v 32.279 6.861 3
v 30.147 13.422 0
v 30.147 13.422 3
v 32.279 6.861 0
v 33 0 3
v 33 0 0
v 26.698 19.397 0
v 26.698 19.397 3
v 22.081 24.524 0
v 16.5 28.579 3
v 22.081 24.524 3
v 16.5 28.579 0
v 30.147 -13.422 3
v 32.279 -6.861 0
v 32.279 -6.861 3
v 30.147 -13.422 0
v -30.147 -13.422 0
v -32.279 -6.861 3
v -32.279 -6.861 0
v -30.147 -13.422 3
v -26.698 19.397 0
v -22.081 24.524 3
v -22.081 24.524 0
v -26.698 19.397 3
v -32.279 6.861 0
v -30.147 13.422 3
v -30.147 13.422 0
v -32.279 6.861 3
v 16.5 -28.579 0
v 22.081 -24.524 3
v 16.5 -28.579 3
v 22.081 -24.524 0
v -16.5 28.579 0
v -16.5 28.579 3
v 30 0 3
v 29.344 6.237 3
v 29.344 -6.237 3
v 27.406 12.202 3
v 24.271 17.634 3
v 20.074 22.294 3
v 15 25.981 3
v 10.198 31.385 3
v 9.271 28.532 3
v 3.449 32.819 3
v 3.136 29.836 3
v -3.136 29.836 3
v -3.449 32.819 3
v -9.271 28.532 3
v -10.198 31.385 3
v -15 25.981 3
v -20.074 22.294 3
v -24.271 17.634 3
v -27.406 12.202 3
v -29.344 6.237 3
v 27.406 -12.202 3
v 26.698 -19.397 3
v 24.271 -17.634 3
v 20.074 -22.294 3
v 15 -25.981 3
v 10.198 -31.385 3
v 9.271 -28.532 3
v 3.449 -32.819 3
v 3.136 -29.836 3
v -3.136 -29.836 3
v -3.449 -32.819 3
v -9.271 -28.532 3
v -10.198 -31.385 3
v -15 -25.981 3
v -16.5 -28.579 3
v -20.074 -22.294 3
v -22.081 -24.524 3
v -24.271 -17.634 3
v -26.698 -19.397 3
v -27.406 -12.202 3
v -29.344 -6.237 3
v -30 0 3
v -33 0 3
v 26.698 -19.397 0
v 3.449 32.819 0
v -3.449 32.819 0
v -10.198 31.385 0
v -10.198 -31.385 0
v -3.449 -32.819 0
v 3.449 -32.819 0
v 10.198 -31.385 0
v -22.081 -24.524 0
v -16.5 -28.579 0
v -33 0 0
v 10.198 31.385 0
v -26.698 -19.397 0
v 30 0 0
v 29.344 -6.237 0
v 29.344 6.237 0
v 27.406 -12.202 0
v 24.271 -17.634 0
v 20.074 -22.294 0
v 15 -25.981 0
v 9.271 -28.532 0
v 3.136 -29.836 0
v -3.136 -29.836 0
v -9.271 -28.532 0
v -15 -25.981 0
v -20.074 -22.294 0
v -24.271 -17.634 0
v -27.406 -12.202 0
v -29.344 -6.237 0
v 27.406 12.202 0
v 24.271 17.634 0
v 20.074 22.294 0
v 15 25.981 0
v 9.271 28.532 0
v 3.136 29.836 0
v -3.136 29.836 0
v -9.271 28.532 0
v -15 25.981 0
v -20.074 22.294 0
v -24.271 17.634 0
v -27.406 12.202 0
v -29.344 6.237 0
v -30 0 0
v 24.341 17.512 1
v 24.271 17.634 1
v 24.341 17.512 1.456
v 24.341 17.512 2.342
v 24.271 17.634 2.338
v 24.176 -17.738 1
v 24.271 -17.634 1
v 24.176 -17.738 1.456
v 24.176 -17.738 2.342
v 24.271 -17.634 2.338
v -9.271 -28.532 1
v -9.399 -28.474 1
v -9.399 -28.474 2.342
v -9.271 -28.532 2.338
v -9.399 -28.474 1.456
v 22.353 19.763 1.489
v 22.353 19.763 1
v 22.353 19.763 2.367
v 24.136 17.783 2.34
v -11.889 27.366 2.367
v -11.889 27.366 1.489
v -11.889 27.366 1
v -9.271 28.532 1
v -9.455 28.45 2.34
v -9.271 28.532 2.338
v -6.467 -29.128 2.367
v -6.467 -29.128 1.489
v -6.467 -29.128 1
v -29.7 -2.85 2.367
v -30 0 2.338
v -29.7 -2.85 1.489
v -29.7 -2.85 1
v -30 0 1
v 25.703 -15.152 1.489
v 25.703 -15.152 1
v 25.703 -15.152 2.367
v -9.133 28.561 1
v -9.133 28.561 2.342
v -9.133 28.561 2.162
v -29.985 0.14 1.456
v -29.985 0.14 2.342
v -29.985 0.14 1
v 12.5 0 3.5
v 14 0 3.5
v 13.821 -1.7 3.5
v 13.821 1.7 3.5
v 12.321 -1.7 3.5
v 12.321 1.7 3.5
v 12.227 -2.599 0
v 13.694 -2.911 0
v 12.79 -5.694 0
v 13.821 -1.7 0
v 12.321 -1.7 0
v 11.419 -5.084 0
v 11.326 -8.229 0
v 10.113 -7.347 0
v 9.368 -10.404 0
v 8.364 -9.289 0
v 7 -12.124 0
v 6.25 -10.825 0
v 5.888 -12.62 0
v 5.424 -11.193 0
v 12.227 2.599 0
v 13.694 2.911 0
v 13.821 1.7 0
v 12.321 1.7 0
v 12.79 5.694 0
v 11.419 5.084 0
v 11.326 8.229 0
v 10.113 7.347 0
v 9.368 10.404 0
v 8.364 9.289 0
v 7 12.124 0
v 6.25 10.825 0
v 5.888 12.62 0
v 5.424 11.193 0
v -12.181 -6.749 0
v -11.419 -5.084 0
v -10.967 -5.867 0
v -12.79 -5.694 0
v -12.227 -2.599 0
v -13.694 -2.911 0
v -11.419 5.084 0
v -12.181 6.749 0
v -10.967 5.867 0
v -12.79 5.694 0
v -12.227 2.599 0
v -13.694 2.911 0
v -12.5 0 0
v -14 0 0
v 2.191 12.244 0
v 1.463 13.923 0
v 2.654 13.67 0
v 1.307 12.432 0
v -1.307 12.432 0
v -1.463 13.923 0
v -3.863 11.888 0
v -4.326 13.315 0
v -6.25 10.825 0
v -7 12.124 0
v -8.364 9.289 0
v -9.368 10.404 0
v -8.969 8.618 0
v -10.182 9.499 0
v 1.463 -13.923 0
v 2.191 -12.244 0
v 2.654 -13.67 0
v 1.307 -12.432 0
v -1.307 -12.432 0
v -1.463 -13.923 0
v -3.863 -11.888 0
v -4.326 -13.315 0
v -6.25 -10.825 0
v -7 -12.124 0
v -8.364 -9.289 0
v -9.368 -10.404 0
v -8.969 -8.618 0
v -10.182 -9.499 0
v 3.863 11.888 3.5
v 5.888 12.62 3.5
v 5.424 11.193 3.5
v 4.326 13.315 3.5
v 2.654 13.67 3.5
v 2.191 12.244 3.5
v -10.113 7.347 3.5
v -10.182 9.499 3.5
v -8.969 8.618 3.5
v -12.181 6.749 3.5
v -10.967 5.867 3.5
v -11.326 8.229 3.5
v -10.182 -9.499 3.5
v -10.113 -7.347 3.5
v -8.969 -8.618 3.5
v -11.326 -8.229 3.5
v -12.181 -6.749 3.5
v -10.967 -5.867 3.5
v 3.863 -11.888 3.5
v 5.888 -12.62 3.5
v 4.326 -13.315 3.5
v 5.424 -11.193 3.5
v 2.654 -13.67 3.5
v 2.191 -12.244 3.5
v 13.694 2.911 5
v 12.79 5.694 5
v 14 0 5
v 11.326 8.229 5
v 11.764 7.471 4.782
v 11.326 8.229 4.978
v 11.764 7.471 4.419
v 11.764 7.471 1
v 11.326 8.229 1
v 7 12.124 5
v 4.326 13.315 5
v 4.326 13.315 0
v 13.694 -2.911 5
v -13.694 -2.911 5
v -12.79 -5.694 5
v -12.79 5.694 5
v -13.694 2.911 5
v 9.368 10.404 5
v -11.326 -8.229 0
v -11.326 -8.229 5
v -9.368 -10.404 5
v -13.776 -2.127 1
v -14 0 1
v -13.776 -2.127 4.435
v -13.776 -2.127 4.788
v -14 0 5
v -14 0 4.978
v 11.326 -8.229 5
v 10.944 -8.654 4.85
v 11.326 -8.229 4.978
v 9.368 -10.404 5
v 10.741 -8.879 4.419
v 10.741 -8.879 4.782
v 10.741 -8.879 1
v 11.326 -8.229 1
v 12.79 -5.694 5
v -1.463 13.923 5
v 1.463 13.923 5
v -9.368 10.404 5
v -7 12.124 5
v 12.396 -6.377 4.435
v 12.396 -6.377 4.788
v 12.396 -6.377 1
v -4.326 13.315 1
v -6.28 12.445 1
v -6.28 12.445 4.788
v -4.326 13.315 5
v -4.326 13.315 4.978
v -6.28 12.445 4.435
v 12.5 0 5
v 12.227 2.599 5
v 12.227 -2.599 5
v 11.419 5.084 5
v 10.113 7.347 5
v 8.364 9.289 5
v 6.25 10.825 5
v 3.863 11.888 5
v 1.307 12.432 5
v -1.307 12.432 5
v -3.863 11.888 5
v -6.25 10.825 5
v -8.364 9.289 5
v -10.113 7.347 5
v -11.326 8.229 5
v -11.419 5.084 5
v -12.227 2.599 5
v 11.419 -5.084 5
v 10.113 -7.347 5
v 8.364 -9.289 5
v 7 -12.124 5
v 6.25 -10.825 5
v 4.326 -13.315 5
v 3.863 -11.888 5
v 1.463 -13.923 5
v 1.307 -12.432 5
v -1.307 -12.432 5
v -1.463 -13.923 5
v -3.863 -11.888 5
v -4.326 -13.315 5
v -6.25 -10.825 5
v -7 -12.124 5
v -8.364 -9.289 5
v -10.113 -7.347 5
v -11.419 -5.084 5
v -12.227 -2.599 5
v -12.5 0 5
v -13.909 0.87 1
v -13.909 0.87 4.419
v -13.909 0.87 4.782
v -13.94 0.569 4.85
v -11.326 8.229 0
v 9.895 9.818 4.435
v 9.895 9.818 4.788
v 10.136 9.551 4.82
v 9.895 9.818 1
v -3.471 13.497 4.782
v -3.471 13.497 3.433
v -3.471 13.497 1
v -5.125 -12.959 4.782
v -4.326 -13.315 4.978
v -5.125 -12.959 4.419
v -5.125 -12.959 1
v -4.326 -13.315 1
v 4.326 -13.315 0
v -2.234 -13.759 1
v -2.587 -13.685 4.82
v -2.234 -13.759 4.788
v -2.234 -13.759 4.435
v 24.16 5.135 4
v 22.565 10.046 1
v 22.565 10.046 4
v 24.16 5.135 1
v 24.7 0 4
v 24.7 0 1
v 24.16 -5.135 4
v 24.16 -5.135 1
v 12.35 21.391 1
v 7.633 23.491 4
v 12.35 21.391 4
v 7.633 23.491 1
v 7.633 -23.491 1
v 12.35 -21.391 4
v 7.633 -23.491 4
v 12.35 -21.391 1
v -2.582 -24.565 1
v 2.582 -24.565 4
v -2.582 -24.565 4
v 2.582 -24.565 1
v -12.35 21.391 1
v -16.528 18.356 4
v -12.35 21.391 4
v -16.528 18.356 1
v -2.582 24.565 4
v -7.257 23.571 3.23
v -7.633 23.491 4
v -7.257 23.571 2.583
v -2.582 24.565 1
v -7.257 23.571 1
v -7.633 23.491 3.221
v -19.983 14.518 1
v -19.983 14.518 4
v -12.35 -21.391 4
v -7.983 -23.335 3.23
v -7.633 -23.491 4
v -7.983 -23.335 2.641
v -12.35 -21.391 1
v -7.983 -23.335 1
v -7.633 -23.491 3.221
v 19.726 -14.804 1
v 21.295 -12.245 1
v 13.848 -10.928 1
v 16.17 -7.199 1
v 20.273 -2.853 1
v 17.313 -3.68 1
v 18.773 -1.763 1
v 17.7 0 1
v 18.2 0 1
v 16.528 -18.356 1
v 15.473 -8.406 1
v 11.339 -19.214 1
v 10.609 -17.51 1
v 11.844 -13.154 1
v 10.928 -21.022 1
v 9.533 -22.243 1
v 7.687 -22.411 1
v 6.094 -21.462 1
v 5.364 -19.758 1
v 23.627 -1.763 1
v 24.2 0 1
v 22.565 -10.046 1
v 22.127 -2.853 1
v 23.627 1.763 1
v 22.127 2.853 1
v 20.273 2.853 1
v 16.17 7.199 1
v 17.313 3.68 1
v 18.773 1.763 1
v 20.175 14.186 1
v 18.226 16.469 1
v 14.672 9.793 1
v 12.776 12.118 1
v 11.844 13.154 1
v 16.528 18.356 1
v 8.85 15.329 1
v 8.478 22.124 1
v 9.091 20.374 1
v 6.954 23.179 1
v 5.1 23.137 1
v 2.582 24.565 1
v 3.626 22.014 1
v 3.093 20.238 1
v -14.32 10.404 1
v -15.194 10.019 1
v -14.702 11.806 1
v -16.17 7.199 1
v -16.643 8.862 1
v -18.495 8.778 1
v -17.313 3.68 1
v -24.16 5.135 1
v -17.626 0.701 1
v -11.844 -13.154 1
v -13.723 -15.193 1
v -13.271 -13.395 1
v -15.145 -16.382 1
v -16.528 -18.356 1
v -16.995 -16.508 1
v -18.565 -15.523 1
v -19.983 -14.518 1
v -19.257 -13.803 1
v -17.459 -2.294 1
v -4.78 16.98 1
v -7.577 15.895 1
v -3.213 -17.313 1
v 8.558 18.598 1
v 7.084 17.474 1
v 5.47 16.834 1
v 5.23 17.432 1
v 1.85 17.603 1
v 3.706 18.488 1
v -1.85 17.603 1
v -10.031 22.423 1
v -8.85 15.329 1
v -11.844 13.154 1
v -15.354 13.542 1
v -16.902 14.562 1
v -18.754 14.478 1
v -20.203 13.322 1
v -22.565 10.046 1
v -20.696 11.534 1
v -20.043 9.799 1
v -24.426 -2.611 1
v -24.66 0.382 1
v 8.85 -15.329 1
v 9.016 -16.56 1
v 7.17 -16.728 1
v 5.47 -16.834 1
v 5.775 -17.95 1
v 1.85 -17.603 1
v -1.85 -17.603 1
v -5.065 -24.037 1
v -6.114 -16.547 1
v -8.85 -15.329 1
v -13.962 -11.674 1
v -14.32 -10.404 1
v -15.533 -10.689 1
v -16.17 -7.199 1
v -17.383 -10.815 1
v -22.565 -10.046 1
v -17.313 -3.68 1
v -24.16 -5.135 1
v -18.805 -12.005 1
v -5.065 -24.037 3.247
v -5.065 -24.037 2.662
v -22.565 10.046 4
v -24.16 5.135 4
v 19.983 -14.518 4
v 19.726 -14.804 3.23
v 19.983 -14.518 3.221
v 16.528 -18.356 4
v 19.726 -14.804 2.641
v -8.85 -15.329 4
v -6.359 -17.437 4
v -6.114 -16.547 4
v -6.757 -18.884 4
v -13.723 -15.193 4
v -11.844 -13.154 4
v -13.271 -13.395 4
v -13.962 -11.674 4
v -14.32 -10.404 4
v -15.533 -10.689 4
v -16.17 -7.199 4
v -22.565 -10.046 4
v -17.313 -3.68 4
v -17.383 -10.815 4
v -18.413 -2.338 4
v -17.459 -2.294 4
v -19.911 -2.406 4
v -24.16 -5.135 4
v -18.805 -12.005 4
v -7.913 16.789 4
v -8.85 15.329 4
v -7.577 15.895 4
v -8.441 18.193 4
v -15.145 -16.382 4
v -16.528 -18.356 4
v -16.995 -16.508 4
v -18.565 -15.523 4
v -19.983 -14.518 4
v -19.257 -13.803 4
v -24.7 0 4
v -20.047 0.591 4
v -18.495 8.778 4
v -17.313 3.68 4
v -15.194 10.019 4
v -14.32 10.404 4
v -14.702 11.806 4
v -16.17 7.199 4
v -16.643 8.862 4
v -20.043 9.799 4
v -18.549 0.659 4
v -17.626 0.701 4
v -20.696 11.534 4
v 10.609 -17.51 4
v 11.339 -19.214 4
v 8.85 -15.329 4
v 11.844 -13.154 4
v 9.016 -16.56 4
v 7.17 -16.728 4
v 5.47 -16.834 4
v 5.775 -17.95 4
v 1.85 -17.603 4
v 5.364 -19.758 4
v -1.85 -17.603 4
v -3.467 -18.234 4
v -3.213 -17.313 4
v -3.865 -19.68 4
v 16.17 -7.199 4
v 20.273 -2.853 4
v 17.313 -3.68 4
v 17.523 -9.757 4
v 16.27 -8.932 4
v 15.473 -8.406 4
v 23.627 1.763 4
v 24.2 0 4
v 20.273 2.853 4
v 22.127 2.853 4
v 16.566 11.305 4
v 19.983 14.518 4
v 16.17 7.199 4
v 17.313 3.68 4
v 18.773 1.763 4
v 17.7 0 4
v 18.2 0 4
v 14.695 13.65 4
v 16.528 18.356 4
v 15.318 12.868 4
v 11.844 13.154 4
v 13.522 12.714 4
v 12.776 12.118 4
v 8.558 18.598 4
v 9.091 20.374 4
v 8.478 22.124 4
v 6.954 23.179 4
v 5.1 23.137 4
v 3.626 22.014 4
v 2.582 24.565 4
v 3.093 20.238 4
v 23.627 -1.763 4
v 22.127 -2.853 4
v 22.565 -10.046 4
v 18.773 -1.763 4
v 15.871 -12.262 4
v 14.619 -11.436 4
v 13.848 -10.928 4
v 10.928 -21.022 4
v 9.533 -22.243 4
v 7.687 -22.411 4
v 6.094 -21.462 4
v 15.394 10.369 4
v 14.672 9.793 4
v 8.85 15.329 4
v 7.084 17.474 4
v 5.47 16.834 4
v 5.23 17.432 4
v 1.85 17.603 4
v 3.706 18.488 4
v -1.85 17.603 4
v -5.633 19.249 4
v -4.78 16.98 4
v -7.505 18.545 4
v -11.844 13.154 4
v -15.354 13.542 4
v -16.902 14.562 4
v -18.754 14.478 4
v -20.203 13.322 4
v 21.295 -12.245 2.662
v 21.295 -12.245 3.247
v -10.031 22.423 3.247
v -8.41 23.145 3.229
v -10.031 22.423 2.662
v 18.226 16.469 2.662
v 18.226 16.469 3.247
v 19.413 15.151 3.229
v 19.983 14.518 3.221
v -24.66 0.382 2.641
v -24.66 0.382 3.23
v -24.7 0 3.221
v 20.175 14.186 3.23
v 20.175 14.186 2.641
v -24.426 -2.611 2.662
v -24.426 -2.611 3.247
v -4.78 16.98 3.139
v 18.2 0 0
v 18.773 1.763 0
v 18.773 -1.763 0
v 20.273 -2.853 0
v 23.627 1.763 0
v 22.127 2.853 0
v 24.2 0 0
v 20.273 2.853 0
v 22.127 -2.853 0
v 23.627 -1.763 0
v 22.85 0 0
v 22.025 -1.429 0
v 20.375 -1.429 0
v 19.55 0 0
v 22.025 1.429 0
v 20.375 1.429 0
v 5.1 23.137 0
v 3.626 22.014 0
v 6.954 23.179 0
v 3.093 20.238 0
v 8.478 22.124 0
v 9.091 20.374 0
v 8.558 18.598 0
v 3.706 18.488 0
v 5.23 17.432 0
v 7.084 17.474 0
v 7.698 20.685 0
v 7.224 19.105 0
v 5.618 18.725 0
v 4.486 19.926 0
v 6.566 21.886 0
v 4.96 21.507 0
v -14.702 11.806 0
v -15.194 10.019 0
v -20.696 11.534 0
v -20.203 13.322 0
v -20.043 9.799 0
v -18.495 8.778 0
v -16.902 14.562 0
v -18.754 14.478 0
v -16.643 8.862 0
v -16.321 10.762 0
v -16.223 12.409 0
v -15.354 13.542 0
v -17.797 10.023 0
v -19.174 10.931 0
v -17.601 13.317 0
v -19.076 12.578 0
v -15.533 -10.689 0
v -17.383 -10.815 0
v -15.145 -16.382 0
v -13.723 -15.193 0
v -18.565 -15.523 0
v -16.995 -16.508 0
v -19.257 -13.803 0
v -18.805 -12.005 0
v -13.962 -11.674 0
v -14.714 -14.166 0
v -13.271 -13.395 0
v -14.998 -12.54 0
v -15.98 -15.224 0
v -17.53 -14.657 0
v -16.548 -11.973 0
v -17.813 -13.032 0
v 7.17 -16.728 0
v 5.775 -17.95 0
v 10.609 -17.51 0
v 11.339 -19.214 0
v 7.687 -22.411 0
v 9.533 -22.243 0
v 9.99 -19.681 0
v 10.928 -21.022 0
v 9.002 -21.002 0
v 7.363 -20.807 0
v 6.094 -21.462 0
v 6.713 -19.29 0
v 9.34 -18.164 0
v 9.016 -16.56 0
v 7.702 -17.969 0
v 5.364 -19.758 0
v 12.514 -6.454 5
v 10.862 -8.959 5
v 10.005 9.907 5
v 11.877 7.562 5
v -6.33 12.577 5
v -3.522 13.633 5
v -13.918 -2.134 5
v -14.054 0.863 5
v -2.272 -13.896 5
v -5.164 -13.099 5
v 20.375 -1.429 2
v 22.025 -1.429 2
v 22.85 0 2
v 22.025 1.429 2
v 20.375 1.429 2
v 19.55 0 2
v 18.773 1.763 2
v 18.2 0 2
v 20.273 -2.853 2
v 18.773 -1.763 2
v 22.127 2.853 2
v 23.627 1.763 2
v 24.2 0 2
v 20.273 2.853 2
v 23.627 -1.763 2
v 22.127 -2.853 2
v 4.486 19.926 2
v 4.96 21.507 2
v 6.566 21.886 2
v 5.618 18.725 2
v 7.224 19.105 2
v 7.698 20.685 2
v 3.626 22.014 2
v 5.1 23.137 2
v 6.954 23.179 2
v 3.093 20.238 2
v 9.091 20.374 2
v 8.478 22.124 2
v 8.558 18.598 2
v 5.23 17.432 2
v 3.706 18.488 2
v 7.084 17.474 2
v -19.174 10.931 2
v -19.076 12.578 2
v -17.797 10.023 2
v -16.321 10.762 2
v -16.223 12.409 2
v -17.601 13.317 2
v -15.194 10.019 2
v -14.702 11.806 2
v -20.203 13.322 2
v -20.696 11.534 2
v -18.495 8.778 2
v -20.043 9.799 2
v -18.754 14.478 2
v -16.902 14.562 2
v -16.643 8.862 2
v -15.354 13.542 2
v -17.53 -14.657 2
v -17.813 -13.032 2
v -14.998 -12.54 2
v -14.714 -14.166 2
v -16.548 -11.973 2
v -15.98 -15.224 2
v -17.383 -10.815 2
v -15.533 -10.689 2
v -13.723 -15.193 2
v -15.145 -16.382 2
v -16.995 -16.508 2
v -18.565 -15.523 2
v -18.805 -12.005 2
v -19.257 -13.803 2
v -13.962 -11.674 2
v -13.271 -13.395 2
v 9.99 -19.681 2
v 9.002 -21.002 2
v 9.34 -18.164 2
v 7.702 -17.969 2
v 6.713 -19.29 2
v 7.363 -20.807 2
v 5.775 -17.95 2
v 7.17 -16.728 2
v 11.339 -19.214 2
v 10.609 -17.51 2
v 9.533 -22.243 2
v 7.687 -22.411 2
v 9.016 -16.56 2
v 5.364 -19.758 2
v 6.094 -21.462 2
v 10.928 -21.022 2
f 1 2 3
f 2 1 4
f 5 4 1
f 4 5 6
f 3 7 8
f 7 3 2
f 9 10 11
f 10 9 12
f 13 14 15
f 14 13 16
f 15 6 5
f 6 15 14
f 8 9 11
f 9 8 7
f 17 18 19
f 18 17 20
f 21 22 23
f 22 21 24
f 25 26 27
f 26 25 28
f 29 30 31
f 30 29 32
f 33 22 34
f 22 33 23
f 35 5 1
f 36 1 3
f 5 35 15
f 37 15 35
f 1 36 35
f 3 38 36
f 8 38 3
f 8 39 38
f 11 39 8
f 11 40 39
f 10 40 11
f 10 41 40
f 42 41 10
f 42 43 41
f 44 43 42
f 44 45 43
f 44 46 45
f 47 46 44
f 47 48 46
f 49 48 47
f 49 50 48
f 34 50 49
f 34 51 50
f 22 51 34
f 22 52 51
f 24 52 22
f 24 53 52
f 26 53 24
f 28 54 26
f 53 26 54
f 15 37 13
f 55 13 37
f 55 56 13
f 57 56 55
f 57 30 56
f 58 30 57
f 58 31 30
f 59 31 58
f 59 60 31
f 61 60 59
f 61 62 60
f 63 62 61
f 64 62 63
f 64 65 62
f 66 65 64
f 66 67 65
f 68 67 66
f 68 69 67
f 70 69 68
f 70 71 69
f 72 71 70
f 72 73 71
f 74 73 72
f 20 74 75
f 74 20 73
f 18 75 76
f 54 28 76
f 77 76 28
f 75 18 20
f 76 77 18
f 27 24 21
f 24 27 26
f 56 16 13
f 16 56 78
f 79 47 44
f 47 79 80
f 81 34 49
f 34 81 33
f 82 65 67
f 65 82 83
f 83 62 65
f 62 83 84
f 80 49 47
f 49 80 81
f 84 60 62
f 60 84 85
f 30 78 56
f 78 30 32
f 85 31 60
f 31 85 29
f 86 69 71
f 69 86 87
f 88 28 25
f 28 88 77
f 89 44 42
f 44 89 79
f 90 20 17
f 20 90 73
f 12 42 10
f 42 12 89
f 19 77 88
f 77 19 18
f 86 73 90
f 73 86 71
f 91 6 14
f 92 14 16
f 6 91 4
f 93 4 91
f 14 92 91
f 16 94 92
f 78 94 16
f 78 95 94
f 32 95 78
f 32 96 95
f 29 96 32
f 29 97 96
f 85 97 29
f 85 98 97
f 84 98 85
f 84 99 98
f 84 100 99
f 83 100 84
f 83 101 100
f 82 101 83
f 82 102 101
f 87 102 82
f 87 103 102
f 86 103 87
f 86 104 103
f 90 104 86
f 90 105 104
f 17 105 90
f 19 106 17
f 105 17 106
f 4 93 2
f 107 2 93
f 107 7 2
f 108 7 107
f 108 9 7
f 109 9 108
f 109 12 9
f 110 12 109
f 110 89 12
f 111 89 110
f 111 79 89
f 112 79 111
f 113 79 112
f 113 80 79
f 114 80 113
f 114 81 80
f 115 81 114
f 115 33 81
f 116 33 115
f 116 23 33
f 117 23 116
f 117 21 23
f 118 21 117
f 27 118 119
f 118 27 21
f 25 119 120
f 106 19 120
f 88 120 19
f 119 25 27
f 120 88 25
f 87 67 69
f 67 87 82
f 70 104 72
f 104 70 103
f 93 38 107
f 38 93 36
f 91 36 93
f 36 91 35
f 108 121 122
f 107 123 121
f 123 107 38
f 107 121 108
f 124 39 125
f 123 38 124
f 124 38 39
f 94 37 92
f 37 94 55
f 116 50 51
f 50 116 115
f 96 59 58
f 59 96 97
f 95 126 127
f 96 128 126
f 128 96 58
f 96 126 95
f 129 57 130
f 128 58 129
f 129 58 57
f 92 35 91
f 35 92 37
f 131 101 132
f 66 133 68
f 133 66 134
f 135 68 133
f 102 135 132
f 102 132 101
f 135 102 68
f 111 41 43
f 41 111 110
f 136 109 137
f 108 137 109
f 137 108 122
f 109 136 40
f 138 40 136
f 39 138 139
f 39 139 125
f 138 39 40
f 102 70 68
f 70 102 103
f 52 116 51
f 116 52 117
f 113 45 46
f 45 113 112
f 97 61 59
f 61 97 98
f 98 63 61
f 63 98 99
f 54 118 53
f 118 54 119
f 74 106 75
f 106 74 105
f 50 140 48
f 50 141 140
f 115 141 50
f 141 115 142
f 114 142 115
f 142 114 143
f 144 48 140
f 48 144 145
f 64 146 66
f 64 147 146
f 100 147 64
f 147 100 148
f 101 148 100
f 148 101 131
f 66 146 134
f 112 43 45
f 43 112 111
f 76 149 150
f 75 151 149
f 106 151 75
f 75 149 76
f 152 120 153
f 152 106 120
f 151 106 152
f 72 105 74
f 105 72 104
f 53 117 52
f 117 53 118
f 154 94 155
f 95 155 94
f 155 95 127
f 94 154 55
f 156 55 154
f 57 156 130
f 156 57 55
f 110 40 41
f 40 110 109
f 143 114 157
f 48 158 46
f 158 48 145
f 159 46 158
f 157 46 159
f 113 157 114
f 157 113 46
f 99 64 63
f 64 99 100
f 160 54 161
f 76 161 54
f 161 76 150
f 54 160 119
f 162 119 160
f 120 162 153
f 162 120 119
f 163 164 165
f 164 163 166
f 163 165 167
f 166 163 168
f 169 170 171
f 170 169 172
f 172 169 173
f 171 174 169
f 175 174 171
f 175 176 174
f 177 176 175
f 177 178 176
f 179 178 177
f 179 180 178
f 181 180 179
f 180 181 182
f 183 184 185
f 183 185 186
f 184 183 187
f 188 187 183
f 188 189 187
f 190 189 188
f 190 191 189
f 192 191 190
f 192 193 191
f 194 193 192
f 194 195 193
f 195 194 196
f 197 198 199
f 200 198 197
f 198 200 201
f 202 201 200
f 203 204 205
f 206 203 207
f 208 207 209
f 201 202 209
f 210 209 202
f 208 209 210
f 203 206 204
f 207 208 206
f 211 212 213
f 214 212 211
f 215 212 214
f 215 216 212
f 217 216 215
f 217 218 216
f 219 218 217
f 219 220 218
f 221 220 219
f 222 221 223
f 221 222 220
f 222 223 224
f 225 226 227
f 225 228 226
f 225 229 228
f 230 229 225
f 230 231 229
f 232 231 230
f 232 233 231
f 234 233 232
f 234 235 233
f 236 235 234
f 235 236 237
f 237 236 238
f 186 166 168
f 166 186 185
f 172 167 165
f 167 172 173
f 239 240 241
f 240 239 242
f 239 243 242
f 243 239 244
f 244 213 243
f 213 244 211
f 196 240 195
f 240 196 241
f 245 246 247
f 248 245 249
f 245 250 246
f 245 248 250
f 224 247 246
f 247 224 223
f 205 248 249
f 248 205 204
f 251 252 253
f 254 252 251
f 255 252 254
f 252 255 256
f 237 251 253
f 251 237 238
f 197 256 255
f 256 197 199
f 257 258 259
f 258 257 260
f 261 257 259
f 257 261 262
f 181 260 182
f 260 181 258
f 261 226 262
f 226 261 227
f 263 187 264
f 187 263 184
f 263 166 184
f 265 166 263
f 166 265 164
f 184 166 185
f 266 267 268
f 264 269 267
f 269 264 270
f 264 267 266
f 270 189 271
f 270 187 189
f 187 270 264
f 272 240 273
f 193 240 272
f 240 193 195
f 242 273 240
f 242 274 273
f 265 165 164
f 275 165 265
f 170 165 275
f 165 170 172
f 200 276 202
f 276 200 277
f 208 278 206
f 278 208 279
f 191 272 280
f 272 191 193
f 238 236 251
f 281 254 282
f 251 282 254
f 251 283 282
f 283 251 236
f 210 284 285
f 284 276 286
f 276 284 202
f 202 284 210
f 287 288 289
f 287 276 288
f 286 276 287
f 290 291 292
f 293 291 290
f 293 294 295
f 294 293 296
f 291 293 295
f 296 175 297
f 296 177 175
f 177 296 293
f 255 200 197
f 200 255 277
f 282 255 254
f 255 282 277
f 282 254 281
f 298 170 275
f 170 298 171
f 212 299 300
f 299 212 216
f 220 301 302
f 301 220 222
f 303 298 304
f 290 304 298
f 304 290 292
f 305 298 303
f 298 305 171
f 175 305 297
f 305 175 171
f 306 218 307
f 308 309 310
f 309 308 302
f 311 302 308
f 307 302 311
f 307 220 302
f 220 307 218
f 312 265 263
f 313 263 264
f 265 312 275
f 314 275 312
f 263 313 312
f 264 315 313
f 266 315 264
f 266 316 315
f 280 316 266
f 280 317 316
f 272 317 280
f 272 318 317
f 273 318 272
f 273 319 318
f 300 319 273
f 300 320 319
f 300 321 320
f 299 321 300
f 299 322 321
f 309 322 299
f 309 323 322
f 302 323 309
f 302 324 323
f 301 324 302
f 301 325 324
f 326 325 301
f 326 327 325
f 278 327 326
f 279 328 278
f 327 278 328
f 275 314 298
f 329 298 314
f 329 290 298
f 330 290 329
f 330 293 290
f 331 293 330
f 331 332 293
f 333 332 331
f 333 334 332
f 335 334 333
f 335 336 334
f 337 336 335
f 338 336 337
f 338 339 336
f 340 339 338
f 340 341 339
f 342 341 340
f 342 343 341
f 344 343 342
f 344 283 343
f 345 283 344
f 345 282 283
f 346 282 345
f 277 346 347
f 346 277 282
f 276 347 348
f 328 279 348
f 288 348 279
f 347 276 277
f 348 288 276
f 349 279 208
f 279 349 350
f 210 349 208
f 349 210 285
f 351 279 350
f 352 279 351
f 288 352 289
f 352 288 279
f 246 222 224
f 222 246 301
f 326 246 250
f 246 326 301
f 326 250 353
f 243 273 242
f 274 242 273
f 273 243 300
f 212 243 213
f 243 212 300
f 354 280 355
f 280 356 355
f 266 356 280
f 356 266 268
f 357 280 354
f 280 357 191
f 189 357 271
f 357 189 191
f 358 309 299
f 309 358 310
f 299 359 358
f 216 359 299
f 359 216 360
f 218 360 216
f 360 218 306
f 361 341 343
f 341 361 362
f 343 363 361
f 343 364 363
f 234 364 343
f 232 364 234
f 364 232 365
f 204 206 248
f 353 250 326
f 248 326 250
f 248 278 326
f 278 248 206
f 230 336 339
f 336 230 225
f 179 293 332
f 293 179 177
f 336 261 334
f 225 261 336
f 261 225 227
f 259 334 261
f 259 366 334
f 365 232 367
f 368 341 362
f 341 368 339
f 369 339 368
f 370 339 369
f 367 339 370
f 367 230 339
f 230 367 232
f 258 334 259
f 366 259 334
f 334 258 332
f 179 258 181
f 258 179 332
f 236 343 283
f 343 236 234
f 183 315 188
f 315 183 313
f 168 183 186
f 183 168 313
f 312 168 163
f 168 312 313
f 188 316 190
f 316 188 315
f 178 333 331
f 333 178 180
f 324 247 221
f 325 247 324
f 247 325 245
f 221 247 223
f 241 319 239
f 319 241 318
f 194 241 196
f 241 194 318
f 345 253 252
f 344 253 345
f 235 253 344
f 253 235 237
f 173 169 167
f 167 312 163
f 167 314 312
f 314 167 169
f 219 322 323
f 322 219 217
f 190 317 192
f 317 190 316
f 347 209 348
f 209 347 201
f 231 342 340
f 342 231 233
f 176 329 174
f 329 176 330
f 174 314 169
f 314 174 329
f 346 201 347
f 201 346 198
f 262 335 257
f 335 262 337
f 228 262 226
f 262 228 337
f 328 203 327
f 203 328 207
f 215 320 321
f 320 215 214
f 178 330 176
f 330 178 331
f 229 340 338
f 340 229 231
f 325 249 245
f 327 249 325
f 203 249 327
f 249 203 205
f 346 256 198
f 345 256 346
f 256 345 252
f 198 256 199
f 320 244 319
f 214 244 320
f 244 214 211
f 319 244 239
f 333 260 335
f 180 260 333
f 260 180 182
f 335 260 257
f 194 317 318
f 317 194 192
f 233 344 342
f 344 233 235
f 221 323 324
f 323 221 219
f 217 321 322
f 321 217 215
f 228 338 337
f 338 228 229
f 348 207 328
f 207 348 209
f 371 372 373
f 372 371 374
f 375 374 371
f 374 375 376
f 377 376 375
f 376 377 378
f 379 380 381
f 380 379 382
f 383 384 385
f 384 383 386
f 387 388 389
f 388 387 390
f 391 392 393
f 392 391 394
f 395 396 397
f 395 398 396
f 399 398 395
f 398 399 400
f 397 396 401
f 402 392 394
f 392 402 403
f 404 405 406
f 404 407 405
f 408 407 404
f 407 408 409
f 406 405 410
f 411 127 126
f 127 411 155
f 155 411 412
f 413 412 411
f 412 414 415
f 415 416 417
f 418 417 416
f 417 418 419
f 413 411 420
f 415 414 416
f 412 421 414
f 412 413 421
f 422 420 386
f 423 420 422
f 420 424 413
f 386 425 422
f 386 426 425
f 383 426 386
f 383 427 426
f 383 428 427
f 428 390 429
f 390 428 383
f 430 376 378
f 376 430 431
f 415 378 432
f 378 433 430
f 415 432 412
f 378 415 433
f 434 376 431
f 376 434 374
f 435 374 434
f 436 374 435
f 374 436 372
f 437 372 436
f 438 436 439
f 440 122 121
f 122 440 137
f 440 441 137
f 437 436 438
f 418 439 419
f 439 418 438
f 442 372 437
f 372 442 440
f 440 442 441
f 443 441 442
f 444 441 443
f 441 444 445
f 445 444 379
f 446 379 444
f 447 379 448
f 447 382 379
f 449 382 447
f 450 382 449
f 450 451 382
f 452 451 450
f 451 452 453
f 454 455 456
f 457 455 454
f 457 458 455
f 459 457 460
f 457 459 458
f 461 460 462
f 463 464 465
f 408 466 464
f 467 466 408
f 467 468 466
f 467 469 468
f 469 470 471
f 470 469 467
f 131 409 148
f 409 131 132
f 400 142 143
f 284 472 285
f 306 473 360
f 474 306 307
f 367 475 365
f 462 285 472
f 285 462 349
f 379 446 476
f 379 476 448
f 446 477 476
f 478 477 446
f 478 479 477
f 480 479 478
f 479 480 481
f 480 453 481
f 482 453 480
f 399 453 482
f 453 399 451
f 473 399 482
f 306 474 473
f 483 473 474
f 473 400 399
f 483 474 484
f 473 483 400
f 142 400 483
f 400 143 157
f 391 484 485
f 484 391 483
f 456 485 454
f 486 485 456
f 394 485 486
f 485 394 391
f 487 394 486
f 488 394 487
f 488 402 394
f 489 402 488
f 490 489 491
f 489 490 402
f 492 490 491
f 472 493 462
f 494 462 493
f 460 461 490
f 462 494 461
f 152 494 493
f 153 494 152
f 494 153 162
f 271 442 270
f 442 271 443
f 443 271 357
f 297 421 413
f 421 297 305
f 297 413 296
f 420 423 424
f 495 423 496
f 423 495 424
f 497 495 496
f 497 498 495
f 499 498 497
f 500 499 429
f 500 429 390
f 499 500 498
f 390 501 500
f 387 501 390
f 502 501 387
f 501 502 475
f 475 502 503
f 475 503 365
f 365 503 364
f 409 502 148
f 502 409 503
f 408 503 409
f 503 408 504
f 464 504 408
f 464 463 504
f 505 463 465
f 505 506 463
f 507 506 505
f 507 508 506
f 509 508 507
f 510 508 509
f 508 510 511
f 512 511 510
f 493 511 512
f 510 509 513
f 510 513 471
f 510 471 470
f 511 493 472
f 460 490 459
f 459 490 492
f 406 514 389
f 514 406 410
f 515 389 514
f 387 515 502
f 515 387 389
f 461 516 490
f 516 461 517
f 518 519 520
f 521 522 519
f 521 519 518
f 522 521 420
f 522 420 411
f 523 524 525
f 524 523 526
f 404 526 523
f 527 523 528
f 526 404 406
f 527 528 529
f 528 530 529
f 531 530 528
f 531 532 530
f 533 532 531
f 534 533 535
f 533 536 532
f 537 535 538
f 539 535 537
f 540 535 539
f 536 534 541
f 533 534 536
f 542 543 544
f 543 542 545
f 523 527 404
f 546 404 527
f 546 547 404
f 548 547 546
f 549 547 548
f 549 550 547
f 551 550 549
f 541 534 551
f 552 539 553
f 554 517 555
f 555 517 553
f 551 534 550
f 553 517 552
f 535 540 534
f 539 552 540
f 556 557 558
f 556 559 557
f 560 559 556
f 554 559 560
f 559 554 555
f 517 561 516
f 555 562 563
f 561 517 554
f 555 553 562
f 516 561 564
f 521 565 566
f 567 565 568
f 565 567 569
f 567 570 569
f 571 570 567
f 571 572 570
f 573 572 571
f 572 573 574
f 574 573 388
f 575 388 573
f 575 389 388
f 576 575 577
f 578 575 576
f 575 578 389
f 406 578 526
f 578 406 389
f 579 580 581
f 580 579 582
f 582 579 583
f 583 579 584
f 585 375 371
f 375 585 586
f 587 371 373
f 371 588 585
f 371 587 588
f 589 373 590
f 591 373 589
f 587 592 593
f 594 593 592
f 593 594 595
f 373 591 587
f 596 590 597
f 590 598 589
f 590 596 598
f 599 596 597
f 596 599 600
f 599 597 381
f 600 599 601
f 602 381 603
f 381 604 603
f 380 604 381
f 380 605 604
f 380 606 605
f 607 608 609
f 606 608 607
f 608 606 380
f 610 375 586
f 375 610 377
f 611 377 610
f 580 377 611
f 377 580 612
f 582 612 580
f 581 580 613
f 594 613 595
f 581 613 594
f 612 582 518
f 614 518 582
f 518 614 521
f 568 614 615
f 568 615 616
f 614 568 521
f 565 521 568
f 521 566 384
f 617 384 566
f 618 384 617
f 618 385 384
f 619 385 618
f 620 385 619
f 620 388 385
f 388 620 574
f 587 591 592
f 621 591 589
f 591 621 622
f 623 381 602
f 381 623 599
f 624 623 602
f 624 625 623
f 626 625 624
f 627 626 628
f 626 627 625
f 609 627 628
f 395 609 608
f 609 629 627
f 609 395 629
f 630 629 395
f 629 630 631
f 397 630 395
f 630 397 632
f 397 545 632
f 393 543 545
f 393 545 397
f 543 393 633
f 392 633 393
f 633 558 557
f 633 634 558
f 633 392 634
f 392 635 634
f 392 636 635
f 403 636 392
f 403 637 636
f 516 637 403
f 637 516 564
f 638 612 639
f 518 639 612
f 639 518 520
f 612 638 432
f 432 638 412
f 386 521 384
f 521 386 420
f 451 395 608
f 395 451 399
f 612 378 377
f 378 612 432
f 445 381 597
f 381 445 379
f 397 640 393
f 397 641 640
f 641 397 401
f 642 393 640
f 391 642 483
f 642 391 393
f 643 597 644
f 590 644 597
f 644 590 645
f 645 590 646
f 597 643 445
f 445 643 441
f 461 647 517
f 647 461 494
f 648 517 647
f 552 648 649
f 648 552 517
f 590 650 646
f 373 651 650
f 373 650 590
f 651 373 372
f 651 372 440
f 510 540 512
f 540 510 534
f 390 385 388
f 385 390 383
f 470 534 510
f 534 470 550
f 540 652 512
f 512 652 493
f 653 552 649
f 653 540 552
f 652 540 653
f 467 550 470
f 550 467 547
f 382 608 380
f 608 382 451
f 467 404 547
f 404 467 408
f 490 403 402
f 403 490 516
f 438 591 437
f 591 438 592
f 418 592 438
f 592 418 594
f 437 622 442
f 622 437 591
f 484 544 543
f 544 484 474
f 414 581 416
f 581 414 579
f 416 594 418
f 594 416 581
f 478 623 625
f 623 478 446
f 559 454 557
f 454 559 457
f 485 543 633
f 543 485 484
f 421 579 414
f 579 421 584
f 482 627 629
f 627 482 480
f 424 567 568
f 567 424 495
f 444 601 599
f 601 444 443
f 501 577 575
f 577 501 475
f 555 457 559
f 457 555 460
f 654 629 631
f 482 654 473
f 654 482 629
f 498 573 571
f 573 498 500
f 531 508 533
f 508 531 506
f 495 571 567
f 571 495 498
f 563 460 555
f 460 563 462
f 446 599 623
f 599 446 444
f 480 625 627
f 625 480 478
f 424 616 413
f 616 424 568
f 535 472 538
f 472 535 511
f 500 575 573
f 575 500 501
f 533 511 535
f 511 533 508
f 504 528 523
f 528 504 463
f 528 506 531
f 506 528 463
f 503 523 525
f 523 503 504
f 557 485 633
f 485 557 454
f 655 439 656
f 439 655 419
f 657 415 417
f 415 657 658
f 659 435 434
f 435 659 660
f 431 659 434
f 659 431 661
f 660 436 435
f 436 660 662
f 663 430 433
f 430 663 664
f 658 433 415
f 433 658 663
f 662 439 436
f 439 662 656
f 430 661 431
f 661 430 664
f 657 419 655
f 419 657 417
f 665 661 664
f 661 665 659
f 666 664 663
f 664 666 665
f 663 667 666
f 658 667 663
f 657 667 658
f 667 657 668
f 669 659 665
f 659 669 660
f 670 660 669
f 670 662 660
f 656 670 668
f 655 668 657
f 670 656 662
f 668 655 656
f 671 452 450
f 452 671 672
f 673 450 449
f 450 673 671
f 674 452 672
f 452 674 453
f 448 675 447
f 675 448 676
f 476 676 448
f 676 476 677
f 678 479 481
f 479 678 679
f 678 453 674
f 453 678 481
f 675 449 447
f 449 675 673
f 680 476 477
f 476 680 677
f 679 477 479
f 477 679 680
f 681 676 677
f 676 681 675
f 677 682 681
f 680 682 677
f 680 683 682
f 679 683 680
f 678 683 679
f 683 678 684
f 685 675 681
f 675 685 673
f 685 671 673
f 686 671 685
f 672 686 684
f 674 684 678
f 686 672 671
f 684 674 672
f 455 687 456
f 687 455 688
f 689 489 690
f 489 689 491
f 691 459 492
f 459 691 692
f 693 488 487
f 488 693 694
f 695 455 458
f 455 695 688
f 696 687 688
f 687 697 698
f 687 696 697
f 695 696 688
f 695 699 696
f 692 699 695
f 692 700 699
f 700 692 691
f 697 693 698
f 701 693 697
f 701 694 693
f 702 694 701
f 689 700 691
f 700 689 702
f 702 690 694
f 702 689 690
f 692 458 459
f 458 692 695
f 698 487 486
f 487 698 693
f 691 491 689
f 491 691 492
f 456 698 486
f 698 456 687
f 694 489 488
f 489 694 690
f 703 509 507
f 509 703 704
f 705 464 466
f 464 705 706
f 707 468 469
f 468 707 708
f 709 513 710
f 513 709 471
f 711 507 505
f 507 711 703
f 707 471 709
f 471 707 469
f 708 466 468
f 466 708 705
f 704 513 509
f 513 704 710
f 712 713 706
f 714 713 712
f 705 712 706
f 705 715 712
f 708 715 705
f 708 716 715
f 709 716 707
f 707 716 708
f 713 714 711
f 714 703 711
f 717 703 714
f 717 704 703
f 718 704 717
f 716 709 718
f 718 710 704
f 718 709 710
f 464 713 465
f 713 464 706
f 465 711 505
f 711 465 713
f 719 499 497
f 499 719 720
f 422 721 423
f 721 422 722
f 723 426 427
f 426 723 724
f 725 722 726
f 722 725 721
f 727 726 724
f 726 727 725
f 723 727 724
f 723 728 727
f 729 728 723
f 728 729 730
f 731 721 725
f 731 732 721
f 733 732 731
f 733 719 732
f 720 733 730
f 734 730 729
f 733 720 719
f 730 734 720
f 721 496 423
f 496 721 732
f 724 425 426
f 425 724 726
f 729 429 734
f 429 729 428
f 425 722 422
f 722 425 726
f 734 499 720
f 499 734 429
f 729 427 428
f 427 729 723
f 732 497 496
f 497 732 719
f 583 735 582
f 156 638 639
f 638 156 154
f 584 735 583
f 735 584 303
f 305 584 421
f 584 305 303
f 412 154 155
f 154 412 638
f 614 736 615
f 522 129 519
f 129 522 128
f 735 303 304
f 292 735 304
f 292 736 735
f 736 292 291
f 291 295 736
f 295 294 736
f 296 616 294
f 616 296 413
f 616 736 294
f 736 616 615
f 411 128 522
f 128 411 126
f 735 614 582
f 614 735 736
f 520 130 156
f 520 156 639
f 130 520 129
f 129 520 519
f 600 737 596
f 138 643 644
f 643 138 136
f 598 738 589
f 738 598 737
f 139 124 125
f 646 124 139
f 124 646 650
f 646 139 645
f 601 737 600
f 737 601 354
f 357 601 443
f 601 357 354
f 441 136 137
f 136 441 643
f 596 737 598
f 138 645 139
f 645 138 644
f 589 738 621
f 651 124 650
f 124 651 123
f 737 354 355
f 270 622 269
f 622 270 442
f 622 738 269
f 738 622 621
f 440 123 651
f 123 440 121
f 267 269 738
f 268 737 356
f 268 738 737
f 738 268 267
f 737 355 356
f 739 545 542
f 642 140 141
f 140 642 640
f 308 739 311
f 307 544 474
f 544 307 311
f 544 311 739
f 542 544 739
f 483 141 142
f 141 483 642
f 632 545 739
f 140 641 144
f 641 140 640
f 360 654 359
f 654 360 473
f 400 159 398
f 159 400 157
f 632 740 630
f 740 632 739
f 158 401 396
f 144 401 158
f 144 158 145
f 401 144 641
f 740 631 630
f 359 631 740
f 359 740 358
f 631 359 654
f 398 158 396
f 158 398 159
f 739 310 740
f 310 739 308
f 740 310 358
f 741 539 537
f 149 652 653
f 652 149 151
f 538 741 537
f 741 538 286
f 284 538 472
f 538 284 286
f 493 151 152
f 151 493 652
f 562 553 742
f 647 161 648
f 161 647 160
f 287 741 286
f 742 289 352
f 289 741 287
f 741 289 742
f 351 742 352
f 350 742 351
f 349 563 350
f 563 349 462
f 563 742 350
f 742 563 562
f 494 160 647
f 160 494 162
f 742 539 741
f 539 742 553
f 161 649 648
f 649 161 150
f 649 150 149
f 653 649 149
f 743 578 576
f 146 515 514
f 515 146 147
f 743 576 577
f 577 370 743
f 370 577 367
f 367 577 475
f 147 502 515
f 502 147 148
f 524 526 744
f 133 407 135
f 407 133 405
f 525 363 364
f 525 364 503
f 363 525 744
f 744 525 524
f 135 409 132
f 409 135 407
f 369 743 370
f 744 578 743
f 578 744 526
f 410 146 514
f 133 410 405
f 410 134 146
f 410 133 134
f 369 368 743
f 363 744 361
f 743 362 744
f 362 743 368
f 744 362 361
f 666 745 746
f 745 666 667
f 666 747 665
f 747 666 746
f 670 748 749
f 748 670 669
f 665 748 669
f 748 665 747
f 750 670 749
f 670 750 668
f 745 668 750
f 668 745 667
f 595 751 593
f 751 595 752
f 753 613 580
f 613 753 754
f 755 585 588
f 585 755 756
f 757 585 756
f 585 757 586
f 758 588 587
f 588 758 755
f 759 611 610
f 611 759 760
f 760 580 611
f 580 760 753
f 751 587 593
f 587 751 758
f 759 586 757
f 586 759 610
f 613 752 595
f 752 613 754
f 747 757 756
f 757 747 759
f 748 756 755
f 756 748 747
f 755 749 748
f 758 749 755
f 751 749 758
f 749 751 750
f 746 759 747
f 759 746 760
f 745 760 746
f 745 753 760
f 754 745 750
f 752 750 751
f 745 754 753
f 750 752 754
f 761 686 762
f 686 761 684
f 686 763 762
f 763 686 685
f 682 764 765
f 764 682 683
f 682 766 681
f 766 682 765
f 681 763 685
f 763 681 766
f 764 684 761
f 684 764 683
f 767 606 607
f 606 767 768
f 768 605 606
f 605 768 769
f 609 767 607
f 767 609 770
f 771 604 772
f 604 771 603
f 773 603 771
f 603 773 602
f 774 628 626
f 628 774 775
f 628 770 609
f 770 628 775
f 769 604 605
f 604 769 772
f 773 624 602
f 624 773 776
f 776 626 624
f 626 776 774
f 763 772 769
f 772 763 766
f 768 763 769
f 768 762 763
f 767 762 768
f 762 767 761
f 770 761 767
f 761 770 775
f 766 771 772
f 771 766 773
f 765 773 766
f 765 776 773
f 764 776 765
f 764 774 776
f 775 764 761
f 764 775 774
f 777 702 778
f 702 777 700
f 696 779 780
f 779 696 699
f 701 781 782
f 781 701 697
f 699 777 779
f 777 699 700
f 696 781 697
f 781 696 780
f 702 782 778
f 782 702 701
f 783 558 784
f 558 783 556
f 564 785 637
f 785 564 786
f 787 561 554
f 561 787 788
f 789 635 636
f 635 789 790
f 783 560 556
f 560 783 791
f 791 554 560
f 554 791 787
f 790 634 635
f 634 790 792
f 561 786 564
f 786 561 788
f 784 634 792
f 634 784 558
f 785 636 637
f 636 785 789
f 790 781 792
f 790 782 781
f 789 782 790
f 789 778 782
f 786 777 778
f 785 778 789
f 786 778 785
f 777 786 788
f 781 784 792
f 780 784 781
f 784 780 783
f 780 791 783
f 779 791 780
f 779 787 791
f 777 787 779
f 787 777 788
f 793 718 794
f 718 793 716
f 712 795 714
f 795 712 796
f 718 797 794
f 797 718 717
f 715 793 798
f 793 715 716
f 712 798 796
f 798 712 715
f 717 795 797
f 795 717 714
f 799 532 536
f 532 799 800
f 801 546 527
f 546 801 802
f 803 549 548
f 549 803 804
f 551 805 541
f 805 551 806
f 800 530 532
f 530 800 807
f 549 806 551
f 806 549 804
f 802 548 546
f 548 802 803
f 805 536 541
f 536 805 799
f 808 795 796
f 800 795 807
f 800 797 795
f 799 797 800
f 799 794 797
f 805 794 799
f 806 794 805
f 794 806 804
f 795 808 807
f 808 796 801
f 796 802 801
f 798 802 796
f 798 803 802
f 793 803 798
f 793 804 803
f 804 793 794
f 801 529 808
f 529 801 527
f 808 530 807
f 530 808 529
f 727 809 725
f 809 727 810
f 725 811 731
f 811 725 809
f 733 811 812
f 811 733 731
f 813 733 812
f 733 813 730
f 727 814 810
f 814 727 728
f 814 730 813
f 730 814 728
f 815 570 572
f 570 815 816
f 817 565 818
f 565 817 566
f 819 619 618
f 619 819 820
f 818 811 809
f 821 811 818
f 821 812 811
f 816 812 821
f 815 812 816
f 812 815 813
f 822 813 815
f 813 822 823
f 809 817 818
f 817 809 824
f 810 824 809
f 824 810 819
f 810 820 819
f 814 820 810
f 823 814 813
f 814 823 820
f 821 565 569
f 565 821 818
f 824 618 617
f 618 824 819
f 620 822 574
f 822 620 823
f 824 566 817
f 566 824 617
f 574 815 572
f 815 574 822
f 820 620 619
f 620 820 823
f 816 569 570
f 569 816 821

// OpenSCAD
/// Planetary gear carrier

//$fa = 6;
//$fs = 0.4;

upper_carrier();

module upper_carrier(){
    difference (){
        union () {
            //outer contact race
            difference() {
                cylinder (d=66, h=3);
                translate([0,0,-1]) cylinder (d=60, h=5);
            }
            
            // inner contact race
            difference() {
                cylinder (d=28, h=5);
                translate([0,0,-1])  cylinder (d=25, h=7);
                for (i = [0:4]) {
                    // outer notches for centre button
                    rotate([0,0, (i * 72)]) translate([12,-1.7, 0]) cube([2,3.4,3.5]);
                }
            }
            
            // gear holder
            difference() {
                translate([0,0,1]) cylinder (r=21.2+3.5, h=3);
                translate([0,0,0]) cylinder (r=21.2-3.5, h=5);
            }
                        
            // gear mounts
            for (i = [0, 73.3, 2*73.3, 3*73.3, 4*73.3]) {
                rotate([0,0,i]) translate([21.2,0,0]) cylinder(d=6, h=3);
            }
            
            // fins
            for (i = [0:4]) {
                rotate([0,0, (i * 72) - ((360 - (4*73.3))/2)]) translate([0,0,1]) rotate([90,0,0]) linear_extrude(height=3, center=true) polygon([[13,2.5],[13,0],[32,0],[32,1],[14,4]]) ;
            }
        }
        // gear mounts
        for (i = [0:4]) {
            rotate([0,0,i*73.3]) translate([21.2,0,0]) cylinder(d=3.3, h=3);
            rotate([0,0,i*73.3]) translate([21.2,0,2]) cylinder(d=6, h=3);
        }
    }
}
